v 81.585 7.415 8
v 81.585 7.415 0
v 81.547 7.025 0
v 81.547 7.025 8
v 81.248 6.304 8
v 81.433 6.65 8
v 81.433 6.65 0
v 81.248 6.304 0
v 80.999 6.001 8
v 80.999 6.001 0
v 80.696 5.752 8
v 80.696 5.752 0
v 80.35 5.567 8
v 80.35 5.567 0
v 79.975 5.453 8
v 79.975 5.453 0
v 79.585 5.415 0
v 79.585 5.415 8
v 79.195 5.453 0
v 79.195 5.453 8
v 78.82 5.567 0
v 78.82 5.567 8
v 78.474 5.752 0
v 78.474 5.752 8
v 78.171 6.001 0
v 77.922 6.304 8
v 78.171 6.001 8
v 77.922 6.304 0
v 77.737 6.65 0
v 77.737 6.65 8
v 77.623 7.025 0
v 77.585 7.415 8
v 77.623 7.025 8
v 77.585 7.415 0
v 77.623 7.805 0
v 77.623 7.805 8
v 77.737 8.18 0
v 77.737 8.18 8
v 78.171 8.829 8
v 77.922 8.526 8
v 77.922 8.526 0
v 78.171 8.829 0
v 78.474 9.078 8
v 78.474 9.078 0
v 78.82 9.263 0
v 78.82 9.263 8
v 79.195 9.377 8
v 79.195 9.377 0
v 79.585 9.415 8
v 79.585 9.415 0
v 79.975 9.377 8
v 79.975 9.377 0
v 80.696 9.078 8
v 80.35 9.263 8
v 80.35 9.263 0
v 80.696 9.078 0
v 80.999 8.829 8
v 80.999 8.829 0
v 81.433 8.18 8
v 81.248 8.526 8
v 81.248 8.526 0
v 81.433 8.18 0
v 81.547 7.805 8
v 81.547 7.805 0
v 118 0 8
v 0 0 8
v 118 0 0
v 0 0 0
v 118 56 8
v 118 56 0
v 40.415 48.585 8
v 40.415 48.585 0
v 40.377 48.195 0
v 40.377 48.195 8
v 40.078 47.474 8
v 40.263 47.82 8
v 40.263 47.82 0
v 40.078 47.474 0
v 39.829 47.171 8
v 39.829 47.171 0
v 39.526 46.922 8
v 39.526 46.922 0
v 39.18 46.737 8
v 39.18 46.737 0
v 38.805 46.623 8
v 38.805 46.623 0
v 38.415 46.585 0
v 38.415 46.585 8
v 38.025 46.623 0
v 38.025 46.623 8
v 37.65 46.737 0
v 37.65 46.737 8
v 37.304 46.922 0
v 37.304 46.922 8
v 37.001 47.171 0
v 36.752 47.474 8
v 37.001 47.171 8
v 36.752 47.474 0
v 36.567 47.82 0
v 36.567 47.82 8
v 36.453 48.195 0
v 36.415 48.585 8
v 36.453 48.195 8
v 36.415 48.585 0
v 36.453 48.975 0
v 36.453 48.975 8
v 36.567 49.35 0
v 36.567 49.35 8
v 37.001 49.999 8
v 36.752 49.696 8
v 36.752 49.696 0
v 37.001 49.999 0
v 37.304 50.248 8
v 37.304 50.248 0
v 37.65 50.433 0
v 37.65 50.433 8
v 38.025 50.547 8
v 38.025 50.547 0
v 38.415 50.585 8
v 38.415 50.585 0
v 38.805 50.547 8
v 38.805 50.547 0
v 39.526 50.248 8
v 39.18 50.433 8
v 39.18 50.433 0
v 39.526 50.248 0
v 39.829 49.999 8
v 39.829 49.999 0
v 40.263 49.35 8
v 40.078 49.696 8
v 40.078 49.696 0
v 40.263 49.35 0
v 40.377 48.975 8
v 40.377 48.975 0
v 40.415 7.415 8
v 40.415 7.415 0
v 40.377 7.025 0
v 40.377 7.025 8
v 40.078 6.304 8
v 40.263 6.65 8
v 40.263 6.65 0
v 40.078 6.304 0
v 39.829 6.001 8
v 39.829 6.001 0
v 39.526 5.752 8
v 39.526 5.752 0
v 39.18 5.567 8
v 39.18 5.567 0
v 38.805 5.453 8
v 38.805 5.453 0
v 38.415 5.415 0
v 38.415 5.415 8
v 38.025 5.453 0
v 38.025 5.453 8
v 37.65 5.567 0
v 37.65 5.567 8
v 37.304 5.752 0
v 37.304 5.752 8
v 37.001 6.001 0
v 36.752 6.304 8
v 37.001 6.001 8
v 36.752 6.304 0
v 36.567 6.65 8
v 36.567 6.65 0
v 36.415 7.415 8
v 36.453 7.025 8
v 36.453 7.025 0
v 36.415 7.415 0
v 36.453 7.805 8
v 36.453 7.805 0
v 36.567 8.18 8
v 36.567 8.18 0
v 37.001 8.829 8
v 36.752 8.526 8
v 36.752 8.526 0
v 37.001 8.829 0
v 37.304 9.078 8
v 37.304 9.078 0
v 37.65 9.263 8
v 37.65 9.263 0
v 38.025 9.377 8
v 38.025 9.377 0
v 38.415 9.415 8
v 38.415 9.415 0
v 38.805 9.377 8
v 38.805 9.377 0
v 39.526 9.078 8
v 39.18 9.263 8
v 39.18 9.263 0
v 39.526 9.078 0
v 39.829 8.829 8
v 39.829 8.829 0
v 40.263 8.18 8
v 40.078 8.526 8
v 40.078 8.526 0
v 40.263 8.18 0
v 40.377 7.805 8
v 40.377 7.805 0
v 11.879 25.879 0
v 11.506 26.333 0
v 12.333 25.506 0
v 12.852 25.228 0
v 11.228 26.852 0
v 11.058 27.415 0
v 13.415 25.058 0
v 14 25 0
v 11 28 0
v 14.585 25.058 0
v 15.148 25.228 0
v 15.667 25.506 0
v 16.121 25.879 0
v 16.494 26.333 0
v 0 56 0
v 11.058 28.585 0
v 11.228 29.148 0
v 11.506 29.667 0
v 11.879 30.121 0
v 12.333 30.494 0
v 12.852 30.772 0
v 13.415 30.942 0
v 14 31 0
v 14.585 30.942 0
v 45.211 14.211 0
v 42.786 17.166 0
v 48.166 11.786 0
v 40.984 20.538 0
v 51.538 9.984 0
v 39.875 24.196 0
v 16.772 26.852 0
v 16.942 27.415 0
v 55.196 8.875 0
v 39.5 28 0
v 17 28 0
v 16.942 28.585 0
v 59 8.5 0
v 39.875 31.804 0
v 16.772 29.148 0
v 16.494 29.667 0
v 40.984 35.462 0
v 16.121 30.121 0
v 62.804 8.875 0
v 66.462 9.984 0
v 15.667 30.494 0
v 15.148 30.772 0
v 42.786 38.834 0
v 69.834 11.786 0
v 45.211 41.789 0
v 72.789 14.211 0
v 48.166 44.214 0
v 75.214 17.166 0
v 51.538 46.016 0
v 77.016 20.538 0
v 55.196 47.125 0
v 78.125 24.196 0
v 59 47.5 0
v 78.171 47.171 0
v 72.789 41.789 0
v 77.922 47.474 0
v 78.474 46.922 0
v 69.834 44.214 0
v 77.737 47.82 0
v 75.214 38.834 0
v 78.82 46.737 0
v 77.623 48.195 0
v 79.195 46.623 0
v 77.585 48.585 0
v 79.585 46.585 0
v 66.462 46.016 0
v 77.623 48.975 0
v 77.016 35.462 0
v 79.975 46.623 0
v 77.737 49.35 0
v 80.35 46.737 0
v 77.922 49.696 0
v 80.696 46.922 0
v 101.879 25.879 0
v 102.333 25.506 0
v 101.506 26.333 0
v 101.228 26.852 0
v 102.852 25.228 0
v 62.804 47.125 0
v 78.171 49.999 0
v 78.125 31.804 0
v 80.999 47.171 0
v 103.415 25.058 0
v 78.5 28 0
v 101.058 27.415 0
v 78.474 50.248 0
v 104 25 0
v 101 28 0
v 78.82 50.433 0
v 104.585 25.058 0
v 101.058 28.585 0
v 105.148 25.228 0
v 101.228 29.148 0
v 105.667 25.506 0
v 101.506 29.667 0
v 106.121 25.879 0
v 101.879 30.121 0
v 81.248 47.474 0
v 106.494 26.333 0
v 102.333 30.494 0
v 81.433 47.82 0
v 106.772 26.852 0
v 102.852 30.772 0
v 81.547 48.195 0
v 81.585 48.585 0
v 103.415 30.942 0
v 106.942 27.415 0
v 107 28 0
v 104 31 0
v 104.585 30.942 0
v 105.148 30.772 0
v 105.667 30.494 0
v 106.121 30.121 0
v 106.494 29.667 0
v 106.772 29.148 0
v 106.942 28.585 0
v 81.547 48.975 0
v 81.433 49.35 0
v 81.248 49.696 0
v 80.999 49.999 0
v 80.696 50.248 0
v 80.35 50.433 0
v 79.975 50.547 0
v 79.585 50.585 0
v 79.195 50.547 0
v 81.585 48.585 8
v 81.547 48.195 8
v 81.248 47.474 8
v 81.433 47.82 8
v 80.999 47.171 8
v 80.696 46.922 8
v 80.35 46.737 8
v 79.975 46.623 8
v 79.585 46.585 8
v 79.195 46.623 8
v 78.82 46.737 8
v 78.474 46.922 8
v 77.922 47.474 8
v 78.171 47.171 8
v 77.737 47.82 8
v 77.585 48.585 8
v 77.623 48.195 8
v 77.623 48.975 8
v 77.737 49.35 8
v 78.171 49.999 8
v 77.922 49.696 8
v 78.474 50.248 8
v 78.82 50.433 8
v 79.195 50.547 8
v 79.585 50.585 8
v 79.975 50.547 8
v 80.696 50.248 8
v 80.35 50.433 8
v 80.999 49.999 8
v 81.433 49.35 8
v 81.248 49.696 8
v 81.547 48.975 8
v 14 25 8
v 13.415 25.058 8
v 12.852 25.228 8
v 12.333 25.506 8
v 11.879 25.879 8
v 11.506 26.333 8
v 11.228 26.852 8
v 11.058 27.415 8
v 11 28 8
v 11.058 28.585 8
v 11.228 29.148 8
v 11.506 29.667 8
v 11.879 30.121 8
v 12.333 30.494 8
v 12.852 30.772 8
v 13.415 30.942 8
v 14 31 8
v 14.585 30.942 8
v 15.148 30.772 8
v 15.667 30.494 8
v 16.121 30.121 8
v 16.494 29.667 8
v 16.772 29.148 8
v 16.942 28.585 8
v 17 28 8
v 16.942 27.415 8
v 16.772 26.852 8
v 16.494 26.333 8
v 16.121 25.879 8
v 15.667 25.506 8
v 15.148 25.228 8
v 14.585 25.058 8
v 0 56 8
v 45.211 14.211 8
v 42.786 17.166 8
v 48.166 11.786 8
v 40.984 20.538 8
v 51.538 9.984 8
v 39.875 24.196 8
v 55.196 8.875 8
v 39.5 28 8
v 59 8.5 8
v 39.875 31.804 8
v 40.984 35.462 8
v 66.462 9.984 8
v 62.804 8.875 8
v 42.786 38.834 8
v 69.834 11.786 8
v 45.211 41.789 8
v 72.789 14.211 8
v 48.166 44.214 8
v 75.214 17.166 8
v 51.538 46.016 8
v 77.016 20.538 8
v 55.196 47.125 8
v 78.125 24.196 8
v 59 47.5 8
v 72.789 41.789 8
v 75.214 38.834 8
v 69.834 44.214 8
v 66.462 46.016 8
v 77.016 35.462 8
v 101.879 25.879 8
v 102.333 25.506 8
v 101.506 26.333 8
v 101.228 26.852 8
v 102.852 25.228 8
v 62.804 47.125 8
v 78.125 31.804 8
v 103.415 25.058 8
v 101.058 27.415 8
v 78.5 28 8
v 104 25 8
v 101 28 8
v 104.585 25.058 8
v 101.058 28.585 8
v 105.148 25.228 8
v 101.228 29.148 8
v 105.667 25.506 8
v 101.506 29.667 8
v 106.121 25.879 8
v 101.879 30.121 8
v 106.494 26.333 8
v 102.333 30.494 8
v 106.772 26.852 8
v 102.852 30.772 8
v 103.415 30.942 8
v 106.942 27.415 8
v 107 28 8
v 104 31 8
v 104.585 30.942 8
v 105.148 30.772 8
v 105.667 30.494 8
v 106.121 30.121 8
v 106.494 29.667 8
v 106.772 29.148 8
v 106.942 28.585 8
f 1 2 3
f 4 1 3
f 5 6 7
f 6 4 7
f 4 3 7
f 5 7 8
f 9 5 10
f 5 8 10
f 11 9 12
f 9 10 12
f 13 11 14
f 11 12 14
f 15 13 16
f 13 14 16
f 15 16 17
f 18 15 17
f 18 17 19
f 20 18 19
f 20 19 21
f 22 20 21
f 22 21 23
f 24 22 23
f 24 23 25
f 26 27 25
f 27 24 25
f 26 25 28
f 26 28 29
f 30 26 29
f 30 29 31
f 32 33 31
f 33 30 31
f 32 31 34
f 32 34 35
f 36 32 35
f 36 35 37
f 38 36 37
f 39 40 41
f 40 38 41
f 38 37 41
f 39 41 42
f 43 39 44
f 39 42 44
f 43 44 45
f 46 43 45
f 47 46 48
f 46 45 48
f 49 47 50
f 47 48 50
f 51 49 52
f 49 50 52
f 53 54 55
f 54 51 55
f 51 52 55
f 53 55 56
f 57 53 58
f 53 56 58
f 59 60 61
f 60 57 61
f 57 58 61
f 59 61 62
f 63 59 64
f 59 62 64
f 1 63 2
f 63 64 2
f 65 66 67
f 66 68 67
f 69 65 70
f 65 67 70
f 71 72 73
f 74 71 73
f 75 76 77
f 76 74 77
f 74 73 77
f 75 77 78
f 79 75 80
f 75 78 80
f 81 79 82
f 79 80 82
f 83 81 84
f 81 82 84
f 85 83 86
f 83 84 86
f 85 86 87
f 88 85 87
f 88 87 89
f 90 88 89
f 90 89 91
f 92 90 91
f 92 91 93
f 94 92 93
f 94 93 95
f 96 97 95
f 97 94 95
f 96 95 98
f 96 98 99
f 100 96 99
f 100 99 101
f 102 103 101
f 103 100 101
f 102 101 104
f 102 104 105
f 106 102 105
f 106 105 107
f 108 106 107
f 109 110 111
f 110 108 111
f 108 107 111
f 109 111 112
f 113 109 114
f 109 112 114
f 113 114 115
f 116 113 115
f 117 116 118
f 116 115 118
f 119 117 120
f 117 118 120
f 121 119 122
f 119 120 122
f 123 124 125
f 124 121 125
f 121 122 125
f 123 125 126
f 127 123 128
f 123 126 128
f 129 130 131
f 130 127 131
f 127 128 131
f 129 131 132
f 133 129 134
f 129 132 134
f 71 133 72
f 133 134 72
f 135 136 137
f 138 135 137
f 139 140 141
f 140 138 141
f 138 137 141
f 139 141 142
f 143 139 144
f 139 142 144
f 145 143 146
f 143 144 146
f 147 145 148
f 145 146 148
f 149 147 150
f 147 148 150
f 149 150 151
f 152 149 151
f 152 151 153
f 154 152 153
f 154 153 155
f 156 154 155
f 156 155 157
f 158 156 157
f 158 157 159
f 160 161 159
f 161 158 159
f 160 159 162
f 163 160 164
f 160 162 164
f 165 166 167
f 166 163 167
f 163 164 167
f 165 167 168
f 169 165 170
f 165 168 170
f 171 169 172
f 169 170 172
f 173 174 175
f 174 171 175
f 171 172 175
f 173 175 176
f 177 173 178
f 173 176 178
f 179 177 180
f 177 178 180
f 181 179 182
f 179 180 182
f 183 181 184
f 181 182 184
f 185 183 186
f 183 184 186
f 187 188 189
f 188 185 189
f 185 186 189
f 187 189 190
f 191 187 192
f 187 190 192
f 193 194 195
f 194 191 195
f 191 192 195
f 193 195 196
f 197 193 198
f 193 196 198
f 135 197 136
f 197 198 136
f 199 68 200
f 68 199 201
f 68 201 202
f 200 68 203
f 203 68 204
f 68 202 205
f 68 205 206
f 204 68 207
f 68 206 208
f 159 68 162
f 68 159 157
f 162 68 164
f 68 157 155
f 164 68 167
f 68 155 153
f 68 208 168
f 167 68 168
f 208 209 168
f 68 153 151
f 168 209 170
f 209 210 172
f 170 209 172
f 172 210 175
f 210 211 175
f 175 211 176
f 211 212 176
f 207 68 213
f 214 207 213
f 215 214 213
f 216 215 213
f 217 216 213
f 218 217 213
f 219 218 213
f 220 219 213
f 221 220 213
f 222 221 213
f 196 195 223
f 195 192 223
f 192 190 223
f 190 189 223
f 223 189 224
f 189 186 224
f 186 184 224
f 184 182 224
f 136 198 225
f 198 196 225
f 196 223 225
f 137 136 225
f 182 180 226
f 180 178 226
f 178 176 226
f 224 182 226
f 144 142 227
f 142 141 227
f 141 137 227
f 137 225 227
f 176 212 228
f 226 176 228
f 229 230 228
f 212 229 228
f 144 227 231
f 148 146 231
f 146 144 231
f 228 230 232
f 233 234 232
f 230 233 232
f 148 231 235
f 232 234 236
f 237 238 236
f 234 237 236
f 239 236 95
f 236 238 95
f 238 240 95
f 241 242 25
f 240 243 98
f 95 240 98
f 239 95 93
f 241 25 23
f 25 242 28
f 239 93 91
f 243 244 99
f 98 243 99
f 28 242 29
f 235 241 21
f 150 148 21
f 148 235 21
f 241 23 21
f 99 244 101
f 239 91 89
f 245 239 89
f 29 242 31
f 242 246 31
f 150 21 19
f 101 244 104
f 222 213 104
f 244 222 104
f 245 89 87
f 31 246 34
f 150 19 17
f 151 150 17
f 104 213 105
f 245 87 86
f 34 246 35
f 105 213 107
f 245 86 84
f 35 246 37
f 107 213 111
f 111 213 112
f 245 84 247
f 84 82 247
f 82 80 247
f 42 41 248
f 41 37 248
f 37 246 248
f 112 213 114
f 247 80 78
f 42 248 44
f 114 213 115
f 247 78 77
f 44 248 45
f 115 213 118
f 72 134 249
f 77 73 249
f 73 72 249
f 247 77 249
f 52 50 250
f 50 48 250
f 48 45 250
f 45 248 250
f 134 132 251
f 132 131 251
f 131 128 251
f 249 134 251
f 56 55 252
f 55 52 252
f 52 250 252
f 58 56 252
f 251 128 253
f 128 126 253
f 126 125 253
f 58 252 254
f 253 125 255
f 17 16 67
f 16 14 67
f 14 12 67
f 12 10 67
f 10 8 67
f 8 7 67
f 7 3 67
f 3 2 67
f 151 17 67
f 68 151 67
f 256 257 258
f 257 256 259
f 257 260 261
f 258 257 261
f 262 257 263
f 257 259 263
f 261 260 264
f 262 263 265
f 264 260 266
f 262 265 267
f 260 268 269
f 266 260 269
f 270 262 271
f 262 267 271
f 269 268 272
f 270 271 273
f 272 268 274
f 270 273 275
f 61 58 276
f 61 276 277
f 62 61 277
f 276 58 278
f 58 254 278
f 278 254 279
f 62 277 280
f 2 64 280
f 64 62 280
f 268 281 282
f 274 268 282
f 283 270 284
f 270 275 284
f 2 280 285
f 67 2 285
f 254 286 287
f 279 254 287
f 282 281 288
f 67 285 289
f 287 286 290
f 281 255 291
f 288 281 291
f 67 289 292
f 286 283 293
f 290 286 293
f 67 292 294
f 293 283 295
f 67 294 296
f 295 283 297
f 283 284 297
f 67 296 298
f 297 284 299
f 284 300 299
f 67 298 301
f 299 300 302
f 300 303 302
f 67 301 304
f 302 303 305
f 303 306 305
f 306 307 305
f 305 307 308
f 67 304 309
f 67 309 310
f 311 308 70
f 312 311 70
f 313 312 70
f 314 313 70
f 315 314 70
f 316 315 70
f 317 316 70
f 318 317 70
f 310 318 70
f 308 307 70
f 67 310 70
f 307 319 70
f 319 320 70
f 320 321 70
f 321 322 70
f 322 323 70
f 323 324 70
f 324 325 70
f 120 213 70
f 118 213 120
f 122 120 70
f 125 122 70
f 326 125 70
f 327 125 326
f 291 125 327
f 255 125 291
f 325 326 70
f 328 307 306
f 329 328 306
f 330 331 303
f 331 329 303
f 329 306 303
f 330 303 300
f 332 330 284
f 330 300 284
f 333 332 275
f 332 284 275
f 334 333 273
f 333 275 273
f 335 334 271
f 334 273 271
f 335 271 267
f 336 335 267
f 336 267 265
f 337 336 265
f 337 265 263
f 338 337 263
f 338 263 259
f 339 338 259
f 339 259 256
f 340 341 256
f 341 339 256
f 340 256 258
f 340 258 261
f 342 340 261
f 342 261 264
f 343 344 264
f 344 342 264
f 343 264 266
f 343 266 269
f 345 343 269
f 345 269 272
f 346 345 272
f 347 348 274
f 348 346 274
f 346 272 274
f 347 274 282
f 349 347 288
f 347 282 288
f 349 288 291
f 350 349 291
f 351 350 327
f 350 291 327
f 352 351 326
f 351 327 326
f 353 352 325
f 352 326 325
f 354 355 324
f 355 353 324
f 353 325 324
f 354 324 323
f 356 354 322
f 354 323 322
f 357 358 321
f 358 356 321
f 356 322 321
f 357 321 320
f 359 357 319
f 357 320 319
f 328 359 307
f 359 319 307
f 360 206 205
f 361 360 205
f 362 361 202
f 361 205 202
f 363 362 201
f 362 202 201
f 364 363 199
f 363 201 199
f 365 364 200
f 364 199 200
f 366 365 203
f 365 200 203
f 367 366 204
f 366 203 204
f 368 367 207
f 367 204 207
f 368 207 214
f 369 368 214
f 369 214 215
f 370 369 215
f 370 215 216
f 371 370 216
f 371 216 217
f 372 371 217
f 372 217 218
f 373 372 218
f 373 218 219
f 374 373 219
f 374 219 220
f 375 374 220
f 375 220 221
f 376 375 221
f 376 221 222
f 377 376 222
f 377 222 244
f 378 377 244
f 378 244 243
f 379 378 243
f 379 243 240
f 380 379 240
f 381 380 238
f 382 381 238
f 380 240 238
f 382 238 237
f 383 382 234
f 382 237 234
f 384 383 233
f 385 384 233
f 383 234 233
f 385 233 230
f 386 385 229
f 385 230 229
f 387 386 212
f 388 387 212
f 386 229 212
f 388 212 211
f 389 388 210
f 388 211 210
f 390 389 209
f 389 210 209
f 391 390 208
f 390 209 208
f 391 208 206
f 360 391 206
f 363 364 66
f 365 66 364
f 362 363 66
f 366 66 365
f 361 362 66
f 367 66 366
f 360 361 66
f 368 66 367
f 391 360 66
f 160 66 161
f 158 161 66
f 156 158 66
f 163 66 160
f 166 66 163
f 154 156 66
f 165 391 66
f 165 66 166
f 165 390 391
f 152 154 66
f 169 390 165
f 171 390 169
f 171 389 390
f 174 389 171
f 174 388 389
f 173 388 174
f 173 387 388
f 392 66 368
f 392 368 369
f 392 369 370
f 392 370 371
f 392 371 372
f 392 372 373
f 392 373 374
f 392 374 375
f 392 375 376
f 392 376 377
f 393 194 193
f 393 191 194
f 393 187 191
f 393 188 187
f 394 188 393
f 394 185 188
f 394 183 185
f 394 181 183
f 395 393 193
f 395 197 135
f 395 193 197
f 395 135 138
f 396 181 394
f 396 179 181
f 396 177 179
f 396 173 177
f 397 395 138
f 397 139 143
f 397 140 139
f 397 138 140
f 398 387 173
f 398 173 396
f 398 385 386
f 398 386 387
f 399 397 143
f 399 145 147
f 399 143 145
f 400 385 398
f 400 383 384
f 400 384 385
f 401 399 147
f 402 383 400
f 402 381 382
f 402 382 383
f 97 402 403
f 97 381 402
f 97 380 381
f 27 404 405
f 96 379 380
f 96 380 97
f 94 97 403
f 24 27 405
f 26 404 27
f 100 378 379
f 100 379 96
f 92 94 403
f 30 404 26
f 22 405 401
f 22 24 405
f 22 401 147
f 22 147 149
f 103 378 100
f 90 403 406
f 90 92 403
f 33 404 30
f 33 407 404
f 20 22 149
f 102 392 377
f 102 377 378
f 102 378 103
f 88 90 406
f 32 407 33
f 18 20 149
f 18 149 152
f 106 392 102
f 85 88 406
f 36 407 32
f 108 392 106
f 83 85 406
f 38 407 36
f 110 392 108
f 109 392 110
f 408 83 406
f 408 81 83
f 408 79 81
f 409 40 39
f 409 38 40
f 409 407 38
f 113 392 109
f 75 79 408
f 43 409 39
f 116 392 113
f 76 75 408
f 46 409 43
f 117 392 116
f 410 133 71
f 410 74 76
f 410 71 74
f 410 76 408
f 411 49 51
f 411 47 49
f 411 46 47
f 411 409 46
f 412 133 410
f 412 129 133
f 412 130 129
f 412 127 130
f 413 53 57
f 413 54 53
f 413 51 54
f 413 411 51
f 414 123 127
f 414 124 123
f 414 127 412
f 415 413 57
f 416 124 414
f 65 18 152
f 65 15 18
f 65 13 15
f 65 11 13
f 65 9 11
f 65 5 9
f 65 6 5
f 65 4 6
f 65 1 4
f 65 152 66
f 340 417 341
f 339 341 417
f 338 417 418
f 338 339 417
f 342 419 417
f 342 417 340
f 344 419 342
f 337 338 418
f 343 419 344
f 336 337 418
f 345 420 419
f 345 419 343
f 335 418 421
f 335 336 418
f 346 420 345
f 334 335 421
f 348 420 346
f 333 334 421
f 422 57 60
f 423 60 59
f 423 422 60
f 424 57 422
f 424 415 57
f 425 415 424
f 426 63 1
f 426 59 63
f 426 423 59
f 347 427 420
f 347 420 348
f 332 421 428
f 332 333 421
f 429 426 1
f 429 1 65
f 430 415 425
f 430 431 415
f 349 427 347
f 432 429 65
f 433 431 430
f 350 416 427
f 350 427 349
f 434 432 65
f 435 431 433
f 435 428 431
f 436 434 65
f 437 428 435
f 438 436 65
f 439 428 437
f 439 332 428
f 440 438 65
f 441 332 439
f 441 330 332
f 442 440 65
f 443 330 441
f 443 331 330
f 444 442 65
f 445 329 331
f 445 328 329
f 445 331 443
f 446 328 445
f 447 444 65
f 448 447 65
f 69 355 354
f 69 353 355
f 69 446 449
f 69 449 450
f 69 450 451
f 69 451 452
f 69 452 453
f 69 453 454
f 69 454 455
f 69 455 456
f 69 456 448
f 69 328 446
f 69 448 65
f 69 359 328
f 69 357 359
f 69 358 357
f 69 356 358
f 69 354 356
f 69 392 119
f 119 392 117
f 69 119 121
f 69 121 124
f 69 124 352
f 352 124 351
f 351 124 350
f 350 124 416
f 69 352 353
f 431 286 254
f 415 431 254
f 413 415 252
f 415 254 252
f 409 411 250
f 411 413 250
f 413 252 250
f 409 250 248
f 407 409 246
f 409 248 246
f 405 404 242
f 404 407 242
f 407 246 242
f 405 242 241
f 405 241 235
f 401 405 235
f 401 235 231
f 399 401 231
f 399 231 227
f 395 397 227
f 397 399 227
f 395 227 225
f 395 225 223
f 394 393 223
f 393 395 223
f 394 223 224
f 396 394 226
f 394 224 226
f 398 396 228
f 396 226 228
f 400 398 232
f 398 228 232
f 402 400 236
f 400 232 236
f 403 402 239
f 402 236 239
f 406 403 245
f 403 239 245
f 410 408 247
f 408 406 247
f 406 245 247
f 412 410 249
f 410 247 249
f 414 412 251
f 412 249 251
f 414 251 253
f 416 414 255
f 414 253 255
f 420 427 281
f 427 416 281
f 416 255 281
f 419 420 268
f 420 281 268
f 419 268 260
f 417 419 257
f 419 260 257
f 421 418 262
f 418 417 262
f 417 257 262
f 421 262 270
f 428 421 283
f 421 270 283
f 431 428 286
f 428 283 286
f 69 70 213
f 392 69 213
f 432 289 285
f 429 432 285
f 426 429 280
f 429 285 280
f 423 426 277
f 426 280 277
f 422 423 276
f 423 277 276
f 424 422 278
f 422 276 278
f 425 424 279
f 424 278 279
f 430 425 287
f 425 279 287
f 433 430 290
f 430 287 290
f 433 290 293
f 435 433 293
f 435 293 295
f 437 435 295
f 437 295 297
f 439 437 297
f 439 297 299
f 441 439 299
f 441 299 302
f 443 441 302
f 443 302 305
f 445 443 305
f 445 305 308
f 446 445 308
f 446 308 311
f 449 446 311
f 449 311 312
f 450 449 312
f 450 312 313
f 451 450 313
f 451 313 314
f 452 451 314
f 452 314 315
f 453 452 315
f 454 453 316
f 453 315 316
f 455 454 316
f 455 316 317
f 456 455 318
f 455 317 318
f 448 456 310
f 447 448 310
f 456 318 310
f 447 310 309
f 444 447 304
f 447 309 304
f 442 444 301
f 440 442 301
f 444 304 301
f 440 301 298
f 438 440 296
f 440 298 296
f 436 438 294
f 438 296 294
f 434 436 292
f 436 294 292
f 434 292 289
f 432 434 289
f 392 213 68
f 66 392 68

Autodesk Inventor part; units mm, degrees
ref_plane "YZ Plane" through (0, 0, 0) normal (1, 0, 0) x (0, 1, 0)
ref_plane "XZ Plane" through (0, 0, 0) normal (0, 1, 0) x (-1, 0, 0)
ref_plane "XY Plane" through (0, 0, 0) normal (0, 0, 1) x (1, 0, 0)
sketch "Sketch1" plane through (0, 0, 0) normal (0, 0, 1) x (1, 0, 0)
  line L0 (0, 0) -> (118, 0)
  line L1 (118, 0) -> (118, 56)
  line L2 (118, 56) -> (0, 56)
  line L3 (0, 56) -> (0, 0)
  circle A0 centre (59, 28) radius 19.5
  circle A1 centre (38.415, 48.585) radius 2
  circle A2 centre (38.415, 7.415) radius 2
  circle A3 centre (79.585, 7.415) radius 2
  circle A4 centre (79.585, 48.585) radius 2
  dimension "width" = 118
  dimension "height" = 56
  dimension "d4" = 39
  dimension "d5" = 28
  dimension "d6" = 59
  dimension "d7" = 4
  dimension "d8" = 38.415
  dimension "d11" = 360
  dimension "d13" = 7.415
extrude "Extrusion2" add sketch "Sketch1" along normal blind 8
hole "Hole1" at (104, 28, 8) direction (0, 0, -1) diameter 6 end through all
hole "Hole2" at (14, 28, 8) direction (0, 0, -1) diameter 6 end through all
equation "\"d5\" = 0.5 * height"
equation "\"d6\" = 0.5 * width"
equation "\"d17\" = 0.5 * height"
equation "\"d26\" = 0.5 * height"
properties part number "support motor2"
